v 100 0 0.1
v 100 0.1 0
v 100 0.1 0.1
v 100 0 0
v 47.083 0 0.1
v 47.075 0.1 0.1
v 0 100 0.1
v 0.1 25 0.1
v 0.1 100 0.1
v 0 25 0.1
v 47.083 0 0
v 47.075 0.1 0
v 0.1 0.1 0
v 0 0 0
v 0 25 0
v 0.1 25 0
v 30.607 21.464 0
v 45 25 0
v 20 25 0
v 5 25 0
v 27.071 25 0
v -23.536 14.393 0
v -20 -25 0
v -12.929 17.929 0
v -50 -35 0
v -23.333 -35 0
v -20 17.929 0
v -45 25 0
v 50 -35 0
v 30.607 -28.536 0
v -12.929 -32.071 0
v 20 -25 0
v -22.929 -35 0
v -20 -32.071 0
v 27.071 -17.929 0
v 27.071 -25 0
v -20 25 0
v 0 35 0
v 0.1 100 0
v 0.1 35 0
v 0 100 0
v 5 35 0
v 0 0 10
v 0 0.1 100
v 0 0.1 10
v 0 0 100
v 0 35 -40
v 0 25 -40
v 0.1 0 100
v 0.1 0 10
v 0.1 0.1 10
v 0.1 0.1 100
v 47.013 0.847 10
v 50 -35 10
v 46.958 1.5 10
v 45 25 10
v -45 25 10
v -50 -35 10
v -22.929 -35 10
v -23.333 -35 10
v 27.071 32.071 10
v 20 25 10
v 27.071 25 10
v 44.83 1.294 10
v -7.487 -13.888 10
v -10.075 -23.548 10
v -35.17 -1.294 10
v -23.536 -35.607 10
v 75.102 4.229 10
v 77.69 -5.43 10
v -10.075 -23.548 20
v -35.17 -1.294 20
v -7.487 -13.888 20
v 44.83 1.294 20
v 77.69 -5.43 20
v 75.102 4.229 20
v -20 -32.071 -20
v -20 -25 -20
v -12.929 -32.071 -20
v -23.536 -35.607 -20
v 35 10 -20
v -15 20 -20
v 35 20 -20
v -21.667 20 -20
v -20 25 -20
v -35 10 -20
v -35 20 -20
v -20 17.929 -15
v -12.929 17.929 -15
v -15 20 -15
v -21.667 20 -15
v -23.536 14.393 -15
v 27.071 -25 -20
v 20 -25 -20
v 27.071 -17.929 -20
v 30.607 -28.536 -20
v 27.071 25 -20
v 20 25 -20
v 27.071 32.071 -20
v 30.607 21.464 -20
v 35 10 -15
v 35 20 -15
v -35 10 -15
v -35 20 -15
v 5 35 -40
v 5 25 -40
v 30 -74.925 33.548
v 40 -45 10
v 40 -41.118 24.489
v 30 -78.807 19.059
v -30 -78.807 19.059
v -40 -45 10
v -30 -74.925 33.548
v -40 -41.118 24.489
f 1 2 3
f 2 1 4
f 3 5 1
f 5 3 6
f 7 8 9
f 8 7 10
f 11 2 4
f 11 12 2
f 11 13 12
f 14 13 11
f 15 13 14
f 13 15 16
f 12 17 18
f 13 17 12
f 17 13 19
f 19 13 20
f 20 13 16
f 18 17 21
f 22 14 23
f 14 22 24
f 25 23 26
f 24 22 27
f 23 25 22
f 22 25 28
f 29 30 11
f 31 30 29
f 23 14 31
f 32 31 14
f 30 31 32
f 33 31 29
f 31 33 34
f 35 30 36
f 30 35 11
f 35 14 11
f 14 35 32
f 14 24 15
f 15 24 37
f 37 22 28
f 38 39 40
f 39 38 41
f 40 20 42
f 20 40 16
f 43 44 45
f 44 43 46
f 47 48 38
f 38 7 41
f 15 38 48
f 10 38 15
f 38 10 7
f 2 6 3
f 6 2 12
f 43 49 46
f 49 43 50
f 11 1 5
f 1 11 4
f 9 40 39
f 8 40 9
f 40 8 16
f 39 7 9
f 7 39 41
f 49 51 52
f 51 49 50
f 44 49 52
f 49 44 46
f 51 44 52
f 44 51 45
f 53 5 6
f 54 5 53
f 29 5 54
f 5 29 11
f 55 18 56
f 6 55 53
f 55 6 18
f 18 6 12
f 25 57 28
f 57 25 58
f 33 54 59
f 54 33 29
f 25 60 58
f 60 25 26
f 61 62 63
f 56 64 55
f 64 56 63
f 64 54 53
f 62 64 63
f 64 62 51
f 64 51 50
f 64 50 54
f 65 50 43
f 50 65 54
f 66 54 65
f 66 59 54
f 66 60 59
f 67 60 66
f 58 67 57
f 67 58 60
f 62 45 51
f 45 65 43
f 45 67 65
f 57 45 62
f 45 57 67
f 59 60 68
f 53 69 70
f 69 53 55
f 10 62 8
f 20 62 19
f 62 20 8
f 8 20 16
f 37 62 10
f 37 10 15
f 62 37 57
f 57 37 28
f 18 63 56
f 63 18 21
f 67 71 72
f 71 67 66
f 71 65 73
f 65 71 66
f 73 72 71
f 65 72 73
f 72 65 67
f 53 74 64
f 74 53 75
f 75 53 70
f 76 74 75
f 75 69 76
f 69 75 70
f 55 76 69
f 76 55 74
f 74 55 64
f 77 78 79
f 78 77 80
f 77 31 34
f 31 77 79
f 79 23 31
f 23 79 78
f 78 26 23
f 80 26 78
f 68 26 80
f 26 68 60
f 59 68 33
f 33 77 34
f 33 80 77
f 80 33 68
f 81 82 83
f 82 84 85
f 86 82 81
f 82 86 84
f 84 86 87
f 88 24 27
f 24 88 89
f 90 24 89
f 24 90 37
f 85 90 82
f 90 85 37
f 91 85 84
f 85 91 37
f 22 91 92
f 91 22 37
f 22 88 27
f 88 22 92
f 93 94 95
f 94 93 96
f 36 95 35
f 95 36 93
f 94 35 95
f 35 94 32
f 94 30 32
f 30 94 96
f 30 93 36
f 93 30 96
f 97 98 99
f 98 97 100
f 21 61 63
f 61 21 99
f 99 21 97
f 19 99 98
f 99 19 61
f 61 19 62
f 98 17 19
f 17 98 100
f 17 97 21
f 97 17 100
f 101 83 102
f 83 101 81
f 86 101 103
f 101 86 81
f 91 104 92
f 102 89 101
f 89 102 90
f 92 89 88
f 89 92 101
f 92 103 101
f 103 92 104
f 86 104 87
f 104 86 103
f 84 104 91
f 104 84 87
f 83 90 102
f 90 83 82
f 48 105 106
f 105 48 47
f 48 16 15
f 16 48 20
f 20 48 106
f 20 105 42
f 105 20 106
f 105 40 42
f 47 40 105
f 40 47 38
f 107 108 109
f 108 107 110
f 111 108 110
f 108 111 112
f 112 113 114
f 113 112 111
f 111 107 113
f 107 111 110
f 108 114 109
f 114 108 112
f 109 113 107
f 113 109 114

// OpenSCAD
    // Combined Scene

    // Permanent Model
    
    // Permanent Model (Black)
    color([0, 0, 0]) {
        // Your permanent model code here
        cube([100,0.1,0.1], center = false);
        cube([0.1,100,0.1], center = false);
        cube([0.1,0.1,100], center = false);
    }
    

    // Dynamic Model
    translate([0, 0, 0]) {
    // Seat
    difference() {
        translate([0, 0, 0]) 
            linear_extrude(height=10) 
                polygon(points=[[45, 25], [-45, 25], [-50, -35], [50, -35]]);
        translate([0, 0, -5]) 
            cube([100, 70, 10], center=true);
    }

    // Enhanced Backrest
    translate([0, -45, 10])
        rotate([-15, 0, 0])
        linear_extrude(height=15) 
            polygon(points=[[40, 0], [-40, 0], [-30, -35], [30, -35]]);

    // Curved Armrests
    for (x = [-40, 40]) {
        translate([x, 0, 10]) {
            rotate([0, 0, x > 0 ? 15 : -15])
                linear_extrude(height=10) 
                    polygon(points=[[5, 0], [35, -15], [35, -5], [5, 0]]);
        }
    }

    // Angled Legs
    for (i = [-1, 1]) {
        for (j = [-1, 1]) {
            translate([i * 20, j * 25, -20]) {
                rotate([0, 0, 45 * i])
                    linear_extrude(height=30) 
                        polygon(points=[[0, 0], [5, -10], [5, -5], [10, 0]]);
            }
        }
    }

    // Cross Support Structure
    translate([0, 0, -20]) {
        rotate([0, 0, 0]) {
            linear_extrude(height=5) 
                polygon(points=[[-35, 20], [35, 20], [35, 10], [-35, 10]]);
            rotate([0, 90, 0]) 
                linear_extrude(height=5) 
                    polygon(points=[[-20, 35], [20, 35], [20, 25], [-20, 25]]);
        }
    }

    // Cushioned Under-Seat Design
    translate([0, 0, 0]) {
        difference() {
            translate([0, 0, 1]) 
                linear_extrude(height=9) 
                    polygon(points=[[-20, 5], [-20, -5], [20, -5], [20, 5]]);
            translate([0, 0, -1]) 
                cube([40, 20, 10], center=true);
        }
    }
}
    
